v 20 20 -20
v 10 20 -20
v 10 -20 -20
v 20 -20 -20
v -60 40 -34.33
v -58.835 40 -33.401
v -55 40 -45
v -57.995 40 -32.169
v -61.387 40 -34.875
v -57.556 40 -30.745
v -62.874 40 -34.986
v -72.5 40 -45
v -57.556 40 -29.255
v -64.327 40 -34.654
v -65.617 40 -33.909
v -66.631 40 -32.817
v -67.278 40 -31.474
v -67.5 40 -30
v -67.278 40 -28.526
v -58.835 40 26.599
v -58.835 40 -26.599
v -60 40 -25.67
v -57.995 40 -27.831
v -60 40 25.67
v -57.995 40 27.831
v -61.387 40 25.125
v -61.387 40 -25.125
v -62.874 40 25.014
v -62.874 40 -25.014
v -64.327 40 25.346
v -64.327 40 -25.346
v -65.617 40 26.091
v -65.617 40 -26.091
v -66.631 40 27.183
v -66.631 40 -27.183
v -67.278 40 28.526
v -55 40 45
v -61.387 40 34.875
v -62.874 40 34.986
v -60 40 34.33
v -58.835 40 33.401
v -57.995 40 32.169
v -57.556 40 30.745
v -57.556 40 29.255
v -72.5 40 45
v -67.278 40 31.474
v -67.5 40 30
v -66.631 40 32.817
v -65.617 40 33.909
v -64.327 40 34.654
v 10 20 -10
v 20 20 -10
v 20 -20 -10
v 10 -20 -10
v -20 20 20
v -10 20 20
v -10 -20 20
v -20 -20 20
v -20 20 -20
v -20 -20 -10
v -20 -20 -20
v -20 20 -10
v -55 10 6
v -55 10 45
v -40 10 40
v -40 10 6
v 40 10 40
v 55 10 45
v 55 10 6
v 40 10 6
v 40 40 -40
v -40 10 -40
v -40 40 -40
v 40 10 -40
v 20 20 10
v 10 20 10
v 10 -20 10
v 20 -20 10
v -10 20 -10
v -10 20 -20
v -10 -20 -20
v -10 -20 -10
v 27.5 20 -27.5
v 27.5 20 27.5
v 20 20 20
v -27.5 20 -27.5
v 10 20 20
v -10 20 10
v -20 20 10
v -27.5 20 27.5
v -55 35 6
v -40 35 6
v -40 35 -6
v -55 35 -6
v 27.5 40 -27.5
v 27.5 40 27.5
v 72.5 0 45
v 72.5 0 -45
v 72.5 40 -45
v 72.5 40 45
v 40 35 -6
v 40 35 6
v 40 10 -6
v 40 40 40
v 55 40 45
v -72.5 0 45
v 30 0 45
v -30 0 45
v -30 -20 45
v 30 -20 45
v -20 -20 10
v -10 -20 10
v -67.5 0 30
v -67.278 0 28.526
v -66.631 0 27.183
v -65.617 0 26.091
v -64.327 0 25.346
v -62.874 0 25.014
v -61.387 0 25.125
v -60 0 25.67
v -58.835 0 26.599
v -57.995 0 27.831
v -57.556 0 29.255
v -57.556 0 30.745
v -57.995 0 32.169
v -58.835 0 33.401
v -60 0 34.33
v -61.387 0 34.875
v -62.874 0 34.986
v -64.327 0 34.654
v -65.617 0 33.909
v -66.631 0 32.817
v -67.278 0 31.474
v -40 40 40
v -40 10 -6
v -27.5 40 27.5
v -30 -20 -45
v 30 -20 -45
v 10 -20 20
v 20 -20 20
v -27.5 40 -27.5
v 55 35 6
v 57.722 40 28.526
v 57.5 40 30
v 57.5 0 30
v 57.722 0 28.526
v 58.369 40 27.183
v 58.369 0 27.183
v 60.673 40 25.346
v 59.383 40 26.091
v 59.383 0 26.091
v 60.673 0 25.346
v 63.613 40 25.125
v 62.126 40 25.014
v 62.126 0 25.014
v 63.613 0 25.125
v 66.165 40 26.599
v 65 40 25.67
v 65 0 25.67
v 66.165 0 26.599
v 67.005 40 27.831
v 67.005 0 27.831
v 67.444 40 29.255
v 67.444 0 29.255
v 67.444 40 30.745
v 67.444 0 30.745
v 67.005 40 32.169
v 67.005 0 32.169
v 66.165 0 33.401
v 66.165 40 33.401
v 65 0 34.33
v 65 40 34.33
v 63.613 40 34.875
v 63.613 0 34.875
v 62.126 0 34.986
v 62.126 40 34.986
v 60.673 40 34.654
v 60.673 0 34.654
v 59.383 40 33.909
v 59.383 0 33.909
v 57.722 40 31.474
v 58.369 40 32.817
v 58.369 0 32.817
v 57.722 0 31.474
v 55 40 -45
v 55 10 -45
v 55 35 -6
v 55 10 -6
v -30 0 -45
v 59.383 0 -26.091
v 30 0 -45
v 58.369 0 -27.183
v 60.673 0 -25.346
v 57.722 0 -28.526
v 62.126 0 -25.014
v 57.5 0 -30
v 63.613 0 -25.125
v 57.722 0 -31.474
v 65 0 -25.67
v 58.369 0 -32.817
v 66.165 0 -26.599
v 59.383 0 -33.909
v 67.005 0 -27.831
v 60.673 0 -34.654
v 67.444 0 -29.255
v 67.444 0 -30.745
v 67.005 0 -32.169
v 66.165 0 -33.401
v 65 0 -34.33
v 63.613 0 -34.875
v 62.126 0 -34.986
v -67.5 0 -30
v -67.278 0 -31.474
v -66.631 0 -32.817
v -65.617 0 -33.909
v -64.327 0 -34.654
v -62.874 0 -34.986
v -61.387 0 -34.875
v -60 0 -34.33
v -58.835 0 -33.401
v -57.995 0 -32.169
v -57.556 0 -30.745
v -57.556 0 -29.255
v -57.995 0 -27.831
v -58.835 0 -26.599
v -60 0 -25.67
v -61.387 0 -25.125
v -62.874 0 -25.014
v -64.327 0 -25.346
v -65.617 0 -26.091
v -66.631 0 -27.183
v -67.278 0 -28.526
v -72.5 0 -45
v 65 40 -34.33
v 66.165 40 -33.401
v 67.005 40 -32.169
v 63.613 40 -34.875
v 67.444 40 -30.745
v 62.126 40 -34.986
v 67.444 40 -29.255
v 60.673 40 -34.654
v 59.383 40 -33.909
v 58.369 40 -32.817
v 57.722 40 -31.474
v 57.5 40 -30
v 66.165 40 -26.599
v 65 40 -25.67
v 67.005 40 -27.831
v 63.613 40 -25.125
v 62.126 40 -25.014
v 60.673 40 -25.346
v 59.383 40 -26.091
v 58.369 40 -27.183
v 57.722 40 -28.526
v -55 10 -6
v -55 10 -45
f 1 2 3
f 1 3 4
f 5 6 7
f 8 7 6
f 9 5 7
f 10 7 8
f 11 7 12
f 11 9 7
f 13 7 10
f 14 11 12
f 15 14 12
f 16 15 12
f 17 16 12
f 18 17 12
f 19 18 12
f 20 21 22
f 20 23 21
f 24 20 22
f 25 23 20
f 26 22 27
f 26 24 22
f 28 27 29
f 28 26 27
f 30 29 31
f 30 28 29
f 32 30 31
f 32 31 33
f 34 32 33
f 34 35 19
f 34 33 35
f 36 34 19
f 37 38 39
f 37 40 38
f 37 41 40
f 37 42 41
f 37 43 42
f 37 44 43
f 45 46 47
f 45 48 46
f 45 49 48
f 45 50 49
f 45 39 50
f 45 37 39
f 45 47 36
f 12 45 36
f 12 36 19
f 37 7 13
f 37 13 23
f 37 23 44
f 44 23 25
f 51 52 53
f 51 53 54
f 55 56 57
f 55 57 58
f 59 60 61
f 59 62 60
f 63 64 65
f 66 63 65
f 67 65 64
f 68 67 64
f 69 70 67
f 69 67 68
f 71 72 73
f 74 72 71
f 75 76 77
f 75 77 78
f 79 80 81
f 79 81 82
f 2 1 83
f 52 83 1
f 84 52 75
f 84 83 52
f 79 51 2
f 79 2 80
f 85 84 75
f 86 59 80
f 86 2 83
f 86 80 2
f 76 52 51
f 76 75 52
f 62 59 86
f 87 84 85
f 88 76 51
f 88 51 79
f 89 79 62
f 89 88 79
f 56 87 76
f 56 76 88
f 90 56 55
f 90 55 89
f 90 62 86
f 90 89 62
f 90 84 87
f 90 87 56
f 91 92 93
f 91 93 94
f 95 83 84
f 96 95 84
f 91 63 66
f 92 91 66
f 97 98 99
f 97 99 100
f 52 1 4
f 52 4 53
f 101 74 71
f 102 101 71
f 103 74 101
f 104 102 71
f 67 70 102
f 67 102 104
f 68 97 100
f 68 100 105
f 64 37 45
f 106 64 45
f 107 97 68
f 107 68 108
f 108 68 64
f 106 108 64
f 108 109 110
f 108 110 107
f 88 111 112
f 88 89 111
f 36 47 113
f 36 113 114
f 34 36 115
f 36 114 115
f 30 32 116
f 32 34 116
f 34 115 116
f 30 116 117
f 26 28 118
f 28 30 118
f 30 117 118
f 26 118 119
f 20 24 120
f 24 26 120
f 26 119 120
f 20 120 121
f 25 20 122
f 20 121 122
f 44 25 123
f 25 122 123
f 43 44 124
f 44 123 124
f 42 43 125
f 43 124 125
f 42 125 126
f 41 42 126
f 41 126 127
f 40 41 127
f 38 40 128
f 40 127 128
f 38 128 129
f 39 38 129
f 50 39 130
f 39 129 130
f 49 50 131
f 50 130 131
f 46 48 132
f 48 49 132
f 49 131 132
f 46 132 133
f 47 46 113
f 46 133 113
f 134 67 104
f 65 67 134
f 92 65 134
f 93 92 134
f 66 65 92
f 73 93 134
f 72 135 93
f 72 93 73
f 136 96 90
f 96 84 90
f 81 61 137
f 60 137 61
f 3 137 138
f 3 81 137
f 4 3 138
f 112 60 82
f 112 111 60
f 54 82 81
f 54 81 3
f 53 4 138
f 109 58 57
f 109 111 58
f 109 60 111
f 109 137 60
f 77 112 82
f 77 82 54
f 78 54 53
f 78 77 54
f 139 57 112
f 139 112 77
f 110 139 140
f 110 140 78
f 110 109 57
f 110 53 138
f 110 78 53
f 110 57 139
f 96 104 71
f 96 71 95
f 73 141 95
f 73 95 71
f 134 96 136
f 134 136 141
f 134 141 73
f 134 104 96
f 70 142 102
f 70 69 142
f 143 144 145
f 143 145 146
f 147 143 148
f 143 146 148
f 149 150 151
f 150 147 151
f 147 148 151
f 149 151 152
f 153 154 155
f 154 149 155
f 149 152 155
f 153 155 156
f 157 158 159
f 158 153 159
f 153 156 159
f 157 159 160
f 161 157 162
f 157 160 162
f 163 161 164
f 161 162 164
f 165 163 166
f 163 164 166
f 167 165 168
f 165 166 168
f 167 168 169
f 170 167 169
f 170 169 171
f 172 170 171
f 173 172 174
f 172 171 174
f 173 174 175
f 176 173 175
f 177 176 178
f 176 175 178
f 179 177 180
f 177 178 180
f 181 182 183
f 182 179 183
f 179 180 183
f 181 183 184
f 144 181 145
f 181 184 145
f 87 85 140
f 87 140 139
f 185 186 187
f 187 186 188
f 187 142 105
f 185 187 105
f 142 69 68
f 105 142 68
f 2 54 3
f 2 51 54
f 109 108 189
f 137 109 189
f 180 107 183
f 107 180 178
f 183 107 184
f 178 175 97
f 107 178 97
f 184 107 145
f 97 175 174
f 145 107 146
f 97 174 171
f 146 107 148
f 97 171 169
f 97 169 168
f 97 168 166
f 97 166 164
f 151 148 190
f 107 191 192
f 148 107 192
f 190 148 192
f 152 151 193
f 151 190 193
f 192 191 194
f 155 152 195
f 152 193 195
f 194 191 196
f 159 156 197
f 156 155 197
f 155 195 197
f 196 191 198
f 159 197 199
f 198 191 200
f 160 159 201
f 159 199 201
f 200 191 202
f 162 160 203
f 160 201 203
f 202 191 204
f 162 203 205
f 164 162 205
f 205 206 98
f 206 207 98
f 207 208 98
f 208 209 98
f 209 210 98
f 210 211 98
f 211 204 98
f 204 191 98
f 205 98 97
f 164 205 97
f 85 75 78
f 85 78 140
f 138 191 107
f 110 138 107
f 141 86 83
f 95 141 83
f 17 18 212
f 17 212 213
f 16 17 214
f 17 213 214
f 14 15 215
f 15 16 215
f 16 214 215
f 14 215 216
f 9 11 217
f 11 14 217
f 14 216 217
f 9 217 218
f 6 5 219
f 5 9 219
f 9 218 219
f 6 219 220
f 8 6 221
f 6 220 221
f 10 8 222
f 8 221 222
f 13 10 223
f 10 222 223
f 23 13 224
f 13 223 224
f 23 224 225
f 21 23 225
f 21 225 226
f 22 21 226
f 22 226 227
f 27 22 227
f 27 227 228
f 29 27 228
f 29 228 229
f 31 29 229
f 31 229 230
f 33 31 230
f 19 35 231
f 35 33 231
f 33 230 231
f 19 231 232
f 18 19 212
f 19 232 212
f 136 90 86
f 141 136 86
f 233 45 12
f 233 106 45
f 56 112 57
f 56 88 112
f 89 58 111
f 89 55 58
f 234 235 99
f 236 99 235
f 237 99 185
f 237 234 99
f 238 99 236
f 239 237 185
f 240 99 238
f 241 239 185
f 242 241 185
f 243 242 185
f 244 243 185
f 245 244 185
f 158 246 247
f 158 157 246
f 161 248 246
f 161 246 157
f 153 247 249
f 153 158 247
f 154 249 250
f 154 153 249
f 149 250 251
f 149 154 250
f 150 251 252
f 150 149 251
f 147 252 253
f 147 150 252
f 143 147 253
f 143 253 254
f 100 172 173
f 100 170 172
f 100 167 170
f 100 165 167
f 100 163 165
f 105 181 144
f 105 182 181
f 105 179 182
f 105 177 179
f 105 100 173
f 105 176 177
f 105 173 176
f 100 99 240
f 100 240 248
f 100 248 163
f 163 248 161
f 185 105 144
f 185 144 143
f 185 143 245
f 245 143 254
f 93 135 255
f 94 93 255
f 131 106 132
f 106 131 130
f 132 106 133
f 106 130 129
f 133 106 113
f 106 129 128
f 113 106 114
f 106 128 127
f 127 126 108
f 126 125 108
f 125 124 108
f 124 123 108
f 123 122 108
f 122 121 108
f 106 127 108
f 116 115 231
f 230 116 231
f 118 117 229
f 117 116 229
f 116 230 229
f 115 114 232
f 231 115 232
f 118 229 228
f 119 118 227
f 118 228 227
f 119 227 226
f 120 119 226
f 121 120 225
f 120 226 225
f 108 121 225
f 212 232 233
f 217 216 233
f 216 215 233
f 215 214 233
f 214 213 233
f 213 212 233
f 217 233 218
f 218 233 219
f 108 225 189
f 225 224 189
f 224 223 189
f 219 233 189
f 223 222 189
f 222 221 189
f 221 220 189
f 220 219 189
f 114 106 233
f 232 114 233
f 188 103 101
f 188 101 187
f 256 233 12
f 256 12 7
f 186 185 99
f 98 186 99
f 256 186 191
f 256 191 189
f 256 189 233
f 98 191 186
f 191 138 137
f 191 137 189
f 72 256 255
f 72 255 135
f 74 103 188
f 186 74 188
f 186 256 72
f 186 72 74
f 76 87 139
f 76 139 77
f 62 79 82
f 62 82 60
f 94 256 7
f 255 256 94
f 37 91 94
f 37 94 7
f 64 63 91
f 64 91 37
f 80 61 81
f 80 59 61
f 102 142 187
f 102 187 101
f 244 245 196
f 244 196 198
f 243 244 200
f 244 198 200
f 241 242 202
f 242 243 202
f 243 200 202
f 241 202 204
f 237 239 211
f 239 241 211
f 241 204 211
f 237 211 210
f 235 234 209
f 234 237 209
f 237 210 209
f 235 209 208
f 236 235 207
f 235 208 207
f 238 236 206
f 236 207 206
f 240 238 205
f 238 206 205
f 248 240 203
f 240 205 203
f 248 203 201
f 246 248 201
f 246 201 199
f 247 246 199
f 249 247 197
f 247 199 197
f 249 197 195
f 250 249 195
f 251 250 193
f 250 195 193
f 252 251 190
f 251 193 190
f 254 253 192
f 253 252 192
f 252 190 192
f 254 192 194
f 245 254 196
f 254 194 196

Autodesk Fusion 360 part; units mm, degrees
sketch "Sketch1" plane through (0, 0, 0) normal (0, 1, 0) x (1, 0, 0)
  line L0 (72.5, -45) -> (-72.5, -45)
  line L1 (-72.5, -45) -> (-72.5, 45)
  line L2 (-72.5, 45) -> (72.5, 45)
  line L3 (72.5, 45) -> (72.5, -45)
  line L4 (72.5, -45) -> (-72.5, 45) construction
  line L5 (-72.5, -45) -> (72.5, 45) construction
  dimension "d1" = 145
  dimension "d2" = 90
extrude "Extrude1" add sketch "Sketch1" along normal blind 10
sketch "Sketch2" plane through (0, 10, 0) normal (0, 1, 0) x (-1, 0, 0)
  line L0 (-72.5, -45) -> (72.5, -45)
  line L1 (72.5, -45) -> (72.5, 45)
  line L2 (72.5, 45) -> (-72.5, 45)
  line L3 (-72.5, 45) -> (-72.5, -45)
  line L4 (72.5, -45) -> (55, -45)
  line L5 (55, -45) -> (55, 45)
  line L6 (55, 45) -> (72.5, 45)
  line L7 (72.5, 45) -> (72.5, -45)
  line L8 (-72.5, -45) -> (-55, -45)
  line L9 (-55, -45) -> (-55, 45)
  line L10 (-55, 45) -> (-72.5, 45)
  line L11 (-72.5, 45) -> (-72.5, -45)
  line L12 (-62.5, 30) -> (62.5, 30) construction
  line L13 (62.5, 30) -> (62.5, -30) construction
  line L14 (62.5, -30) -> (-62.5, -30) construction
  line L15 (-62.5, -30) -> (-62.5, 30) construction
  line L16 (-62.5, 30) -> (62.5, -30) construction
  line L17 (62.5, 30) -> (-62.5, -30) construction
  circle A0 centre (62.5, 30) radius 5
  circle A1 centre (-62.5, 30) radius 5
  circle A2 centre (62.5, -30) radius 5
  circle A3 centre (-62.5, -30) radius 5
  line L18 (-40, 40) -> (40, 40)
  line L19 (40, 40) -> (40, -40)
  line L20 (40, -40) -> (-40, -40)
  line L21 (-40, -40) -> (-40, 40)
  line L22 (-40, 40) -> (40, -40) construction
  line L23 (40, 40) -> (-40, -40) construction
  line L24 (-27.5, 27.5) -> (27.5, 27.5)
  line L25 (27.5, 27.5) -> (27.5, -27.5)
  line L26 (27.5, -27.5) -> (-27.5, -27.5)
  line L27 (-27.5, -27.5) -> (-27.5, 27.5)
  line L28 (-27.5, 27.5) -> (27.5, -27.5) construction
  line L29 (27.5, 27.5) -> (-27.5, -27.5) construction
  line L30 (-40, 6) -> (40, 6) construction
  line L31 (40, 6) -> (40, -6) construction
  line L32 (40, -6) -> (-40, -6) construction
  line L33 (-40, -6) -> (-40, 6) construction
  line L34 (-40, 6) -> (40, -6) construction
  line L35 (40, 6) -> (-40, -6) construction
  line L36 (-40, -6) -> (-55, -6)
  line L37 (-55, -6) -> (-55, 6)
  line L38 (-55, 6) -> (-40, 6)
  line L39 (-40, 6) -> (-40, -6)
  line L40 (40, -6) -> (55, -6)
  line L41 (55, -6) -> (55, 6)
  line L42 (55, 6) -> (40, 6)
  line L43 (40, 6) -> (40, -6)
  dimension "d5" = 17.5
  dimension "d6" = 90
  dimension "d7" = 17.5
  dimension "d8" = 90
  dimension "d9" = 125
  dimension "d10" = 60
  dimension "d11" = 10
  dimension "d14" = -125
  dimension "d15" = -60
  dimension "d16" = 80
  dimension "d17" = 80
  dimension "d18" = 55
  dimension "d19" = 55
  dimension "d20" = 80
  dimension "d21" = 12
  dimension "d22" = 12
  dimension "d23" = 12
extrude "Extrude2" add sketch "Sketch2" along normal blind 30 contours L0 L2 L3 L8 L9 L10 L11 L37 | L0 L1 L2 L4 L5 L6 L7 L41 | L18 L19 L20 L21 L39 L43
extrude "Extrude3" cut sketch "Sketch2" against normal blind 10 contours A0 | A1 | A2 | A3
extrude "Extrude4" add sketch "Sketch2" along normal blind 10 contours L24 L25 L26 L27
extrude "Extrude5" add sketch "Sketch2" along normal blind 25 contours L9 L21 L36 L37 L38 L39 | L5 L19 L40 L41 L42 L43
sketch "Sketch3" plane through (0, 0, 0) normal (0, -1, 0) x (1, 0, 0)
  circle A0 centre (62.5, -30) radius 5
  circle A1 centre (-62.5, -30) radius 5
  circle A2 centre (62.5, 30) radius 5
  circle A3 centre (-62.5, 30) radius 5
  line L0 (-72.5, -45) -> (72.5, -45)
  line L1 (72.5, -45) -> (72.5, 45)
  line L2 (72.5, 45) -> (-72.5, 45)
  line L3 (-72.5, 45) -> (-72.5, -45)
  line L4 (30, 45) -> (-30, 45)
  line L5 (-30, 45) -> (-30, -45)
  line L6 (-30, -45) -> (30, -45)
  line L7 (30, -45) -> (30, 45)
  line L8 (30, 45) -> (-30, -45) construction
  line L9 (-30, 45) -> (30, -45) construction
  dimension "d32" = 60
  dimension "d33" = 90
extrude "Extrude6" add sketch "Sketch3" along normal blind 20 contours L0 L2 L4 L5 L6 L7
sketch "Sketch4" plane through (0, 20, 0) normal (0, 1, 0) x (-1, 0, 0)
  line L0 (-27.5, -27.5) -> (27.5, -27.5)
  line L1 (27.5, -27.5) -> (27.5, 27.5)
  line L2 (27.5, 27.5) -> (-27.5, 27.5)
  line L3 (-27.5, 27.5) -> (-27.5, -27.5)
  line L4 (-15, 15) -> (15, 15) construction
  line L5 (15, 15) -> (15, -15) construction
  line L6 (15, -15) -> (-15, -15) construction
  line L7 (-15, -15) -> (-15, 15) construction
  line L8 (-15, 15) -> (15, -15) construction
  line L9 (15, 15) -> (-15, -15) construction
  line L10 (10, -10) -> (20, -10)
  line L11 (20, -10) -> (20, -20)
  line L12 (20, -20) -> (10, -20)
  line L13 (10, -20) -> (10, -10)
  line L14 (10, -10) -> (20, -20) construction
  line L15 (20, -10) -> (10, -20) construction
  line L16 (-10, -20) -> (-20, -20)
  line L17 (-20, -20) -> (-20, -10)
  line L18 (-20, -10) -> (-10, -20) construction
  line L19 (-10, -10) -> (-10, -20)
  line L20 (-10, -10) -> (-20, -20) construction
  line L21 (-20, -10) -> (-10, -10)
  line L22 (20, 10) -> (10, 10)
  line L23 (10, 10) -> (10, 20)
  line L24 (10, 20) -> (20, 10) construction
  line L25 (20, 20) -> (20, 10)
  line L26 (20, 20) -> (10, 10) construction
  line L27 (10, 20) -> (20, 20)
  line L28 (-10, 10) -> (-20, 10)
  line L29 (-20, 10) -> (-20, 20)
  line L30 (-20, 20) -> (-10, 10) construction
  line L31 (-10, 20) -> (-10, 10)
  line L32 (-10, 20) -> (-20, 10) construction
  line L33 (-20, 20) -> (-10, 20)
  point P0 (15, -15)
  point P1 (-15, -15)
  point P2 (-15, -15)
  point P3 (15, 15)
  point P4 (15, 15)
  point P5 (-15, 15)
  point P6 (-15, 15)
  dimension "d36" = 30
  dimension "d37" = 30
  dimension "d38" = 10
  dimension "d39" = 10
  dimension "d42" = -30
  dimension "d43" = 30
extrude "Extrude7" cut sketch "Sketch4" against normal blind 40 contours L10 L11 L12 L13 | L16 L17 L19 L21 | L22 L23 L25 L27 | L28 L29 L31 L33
